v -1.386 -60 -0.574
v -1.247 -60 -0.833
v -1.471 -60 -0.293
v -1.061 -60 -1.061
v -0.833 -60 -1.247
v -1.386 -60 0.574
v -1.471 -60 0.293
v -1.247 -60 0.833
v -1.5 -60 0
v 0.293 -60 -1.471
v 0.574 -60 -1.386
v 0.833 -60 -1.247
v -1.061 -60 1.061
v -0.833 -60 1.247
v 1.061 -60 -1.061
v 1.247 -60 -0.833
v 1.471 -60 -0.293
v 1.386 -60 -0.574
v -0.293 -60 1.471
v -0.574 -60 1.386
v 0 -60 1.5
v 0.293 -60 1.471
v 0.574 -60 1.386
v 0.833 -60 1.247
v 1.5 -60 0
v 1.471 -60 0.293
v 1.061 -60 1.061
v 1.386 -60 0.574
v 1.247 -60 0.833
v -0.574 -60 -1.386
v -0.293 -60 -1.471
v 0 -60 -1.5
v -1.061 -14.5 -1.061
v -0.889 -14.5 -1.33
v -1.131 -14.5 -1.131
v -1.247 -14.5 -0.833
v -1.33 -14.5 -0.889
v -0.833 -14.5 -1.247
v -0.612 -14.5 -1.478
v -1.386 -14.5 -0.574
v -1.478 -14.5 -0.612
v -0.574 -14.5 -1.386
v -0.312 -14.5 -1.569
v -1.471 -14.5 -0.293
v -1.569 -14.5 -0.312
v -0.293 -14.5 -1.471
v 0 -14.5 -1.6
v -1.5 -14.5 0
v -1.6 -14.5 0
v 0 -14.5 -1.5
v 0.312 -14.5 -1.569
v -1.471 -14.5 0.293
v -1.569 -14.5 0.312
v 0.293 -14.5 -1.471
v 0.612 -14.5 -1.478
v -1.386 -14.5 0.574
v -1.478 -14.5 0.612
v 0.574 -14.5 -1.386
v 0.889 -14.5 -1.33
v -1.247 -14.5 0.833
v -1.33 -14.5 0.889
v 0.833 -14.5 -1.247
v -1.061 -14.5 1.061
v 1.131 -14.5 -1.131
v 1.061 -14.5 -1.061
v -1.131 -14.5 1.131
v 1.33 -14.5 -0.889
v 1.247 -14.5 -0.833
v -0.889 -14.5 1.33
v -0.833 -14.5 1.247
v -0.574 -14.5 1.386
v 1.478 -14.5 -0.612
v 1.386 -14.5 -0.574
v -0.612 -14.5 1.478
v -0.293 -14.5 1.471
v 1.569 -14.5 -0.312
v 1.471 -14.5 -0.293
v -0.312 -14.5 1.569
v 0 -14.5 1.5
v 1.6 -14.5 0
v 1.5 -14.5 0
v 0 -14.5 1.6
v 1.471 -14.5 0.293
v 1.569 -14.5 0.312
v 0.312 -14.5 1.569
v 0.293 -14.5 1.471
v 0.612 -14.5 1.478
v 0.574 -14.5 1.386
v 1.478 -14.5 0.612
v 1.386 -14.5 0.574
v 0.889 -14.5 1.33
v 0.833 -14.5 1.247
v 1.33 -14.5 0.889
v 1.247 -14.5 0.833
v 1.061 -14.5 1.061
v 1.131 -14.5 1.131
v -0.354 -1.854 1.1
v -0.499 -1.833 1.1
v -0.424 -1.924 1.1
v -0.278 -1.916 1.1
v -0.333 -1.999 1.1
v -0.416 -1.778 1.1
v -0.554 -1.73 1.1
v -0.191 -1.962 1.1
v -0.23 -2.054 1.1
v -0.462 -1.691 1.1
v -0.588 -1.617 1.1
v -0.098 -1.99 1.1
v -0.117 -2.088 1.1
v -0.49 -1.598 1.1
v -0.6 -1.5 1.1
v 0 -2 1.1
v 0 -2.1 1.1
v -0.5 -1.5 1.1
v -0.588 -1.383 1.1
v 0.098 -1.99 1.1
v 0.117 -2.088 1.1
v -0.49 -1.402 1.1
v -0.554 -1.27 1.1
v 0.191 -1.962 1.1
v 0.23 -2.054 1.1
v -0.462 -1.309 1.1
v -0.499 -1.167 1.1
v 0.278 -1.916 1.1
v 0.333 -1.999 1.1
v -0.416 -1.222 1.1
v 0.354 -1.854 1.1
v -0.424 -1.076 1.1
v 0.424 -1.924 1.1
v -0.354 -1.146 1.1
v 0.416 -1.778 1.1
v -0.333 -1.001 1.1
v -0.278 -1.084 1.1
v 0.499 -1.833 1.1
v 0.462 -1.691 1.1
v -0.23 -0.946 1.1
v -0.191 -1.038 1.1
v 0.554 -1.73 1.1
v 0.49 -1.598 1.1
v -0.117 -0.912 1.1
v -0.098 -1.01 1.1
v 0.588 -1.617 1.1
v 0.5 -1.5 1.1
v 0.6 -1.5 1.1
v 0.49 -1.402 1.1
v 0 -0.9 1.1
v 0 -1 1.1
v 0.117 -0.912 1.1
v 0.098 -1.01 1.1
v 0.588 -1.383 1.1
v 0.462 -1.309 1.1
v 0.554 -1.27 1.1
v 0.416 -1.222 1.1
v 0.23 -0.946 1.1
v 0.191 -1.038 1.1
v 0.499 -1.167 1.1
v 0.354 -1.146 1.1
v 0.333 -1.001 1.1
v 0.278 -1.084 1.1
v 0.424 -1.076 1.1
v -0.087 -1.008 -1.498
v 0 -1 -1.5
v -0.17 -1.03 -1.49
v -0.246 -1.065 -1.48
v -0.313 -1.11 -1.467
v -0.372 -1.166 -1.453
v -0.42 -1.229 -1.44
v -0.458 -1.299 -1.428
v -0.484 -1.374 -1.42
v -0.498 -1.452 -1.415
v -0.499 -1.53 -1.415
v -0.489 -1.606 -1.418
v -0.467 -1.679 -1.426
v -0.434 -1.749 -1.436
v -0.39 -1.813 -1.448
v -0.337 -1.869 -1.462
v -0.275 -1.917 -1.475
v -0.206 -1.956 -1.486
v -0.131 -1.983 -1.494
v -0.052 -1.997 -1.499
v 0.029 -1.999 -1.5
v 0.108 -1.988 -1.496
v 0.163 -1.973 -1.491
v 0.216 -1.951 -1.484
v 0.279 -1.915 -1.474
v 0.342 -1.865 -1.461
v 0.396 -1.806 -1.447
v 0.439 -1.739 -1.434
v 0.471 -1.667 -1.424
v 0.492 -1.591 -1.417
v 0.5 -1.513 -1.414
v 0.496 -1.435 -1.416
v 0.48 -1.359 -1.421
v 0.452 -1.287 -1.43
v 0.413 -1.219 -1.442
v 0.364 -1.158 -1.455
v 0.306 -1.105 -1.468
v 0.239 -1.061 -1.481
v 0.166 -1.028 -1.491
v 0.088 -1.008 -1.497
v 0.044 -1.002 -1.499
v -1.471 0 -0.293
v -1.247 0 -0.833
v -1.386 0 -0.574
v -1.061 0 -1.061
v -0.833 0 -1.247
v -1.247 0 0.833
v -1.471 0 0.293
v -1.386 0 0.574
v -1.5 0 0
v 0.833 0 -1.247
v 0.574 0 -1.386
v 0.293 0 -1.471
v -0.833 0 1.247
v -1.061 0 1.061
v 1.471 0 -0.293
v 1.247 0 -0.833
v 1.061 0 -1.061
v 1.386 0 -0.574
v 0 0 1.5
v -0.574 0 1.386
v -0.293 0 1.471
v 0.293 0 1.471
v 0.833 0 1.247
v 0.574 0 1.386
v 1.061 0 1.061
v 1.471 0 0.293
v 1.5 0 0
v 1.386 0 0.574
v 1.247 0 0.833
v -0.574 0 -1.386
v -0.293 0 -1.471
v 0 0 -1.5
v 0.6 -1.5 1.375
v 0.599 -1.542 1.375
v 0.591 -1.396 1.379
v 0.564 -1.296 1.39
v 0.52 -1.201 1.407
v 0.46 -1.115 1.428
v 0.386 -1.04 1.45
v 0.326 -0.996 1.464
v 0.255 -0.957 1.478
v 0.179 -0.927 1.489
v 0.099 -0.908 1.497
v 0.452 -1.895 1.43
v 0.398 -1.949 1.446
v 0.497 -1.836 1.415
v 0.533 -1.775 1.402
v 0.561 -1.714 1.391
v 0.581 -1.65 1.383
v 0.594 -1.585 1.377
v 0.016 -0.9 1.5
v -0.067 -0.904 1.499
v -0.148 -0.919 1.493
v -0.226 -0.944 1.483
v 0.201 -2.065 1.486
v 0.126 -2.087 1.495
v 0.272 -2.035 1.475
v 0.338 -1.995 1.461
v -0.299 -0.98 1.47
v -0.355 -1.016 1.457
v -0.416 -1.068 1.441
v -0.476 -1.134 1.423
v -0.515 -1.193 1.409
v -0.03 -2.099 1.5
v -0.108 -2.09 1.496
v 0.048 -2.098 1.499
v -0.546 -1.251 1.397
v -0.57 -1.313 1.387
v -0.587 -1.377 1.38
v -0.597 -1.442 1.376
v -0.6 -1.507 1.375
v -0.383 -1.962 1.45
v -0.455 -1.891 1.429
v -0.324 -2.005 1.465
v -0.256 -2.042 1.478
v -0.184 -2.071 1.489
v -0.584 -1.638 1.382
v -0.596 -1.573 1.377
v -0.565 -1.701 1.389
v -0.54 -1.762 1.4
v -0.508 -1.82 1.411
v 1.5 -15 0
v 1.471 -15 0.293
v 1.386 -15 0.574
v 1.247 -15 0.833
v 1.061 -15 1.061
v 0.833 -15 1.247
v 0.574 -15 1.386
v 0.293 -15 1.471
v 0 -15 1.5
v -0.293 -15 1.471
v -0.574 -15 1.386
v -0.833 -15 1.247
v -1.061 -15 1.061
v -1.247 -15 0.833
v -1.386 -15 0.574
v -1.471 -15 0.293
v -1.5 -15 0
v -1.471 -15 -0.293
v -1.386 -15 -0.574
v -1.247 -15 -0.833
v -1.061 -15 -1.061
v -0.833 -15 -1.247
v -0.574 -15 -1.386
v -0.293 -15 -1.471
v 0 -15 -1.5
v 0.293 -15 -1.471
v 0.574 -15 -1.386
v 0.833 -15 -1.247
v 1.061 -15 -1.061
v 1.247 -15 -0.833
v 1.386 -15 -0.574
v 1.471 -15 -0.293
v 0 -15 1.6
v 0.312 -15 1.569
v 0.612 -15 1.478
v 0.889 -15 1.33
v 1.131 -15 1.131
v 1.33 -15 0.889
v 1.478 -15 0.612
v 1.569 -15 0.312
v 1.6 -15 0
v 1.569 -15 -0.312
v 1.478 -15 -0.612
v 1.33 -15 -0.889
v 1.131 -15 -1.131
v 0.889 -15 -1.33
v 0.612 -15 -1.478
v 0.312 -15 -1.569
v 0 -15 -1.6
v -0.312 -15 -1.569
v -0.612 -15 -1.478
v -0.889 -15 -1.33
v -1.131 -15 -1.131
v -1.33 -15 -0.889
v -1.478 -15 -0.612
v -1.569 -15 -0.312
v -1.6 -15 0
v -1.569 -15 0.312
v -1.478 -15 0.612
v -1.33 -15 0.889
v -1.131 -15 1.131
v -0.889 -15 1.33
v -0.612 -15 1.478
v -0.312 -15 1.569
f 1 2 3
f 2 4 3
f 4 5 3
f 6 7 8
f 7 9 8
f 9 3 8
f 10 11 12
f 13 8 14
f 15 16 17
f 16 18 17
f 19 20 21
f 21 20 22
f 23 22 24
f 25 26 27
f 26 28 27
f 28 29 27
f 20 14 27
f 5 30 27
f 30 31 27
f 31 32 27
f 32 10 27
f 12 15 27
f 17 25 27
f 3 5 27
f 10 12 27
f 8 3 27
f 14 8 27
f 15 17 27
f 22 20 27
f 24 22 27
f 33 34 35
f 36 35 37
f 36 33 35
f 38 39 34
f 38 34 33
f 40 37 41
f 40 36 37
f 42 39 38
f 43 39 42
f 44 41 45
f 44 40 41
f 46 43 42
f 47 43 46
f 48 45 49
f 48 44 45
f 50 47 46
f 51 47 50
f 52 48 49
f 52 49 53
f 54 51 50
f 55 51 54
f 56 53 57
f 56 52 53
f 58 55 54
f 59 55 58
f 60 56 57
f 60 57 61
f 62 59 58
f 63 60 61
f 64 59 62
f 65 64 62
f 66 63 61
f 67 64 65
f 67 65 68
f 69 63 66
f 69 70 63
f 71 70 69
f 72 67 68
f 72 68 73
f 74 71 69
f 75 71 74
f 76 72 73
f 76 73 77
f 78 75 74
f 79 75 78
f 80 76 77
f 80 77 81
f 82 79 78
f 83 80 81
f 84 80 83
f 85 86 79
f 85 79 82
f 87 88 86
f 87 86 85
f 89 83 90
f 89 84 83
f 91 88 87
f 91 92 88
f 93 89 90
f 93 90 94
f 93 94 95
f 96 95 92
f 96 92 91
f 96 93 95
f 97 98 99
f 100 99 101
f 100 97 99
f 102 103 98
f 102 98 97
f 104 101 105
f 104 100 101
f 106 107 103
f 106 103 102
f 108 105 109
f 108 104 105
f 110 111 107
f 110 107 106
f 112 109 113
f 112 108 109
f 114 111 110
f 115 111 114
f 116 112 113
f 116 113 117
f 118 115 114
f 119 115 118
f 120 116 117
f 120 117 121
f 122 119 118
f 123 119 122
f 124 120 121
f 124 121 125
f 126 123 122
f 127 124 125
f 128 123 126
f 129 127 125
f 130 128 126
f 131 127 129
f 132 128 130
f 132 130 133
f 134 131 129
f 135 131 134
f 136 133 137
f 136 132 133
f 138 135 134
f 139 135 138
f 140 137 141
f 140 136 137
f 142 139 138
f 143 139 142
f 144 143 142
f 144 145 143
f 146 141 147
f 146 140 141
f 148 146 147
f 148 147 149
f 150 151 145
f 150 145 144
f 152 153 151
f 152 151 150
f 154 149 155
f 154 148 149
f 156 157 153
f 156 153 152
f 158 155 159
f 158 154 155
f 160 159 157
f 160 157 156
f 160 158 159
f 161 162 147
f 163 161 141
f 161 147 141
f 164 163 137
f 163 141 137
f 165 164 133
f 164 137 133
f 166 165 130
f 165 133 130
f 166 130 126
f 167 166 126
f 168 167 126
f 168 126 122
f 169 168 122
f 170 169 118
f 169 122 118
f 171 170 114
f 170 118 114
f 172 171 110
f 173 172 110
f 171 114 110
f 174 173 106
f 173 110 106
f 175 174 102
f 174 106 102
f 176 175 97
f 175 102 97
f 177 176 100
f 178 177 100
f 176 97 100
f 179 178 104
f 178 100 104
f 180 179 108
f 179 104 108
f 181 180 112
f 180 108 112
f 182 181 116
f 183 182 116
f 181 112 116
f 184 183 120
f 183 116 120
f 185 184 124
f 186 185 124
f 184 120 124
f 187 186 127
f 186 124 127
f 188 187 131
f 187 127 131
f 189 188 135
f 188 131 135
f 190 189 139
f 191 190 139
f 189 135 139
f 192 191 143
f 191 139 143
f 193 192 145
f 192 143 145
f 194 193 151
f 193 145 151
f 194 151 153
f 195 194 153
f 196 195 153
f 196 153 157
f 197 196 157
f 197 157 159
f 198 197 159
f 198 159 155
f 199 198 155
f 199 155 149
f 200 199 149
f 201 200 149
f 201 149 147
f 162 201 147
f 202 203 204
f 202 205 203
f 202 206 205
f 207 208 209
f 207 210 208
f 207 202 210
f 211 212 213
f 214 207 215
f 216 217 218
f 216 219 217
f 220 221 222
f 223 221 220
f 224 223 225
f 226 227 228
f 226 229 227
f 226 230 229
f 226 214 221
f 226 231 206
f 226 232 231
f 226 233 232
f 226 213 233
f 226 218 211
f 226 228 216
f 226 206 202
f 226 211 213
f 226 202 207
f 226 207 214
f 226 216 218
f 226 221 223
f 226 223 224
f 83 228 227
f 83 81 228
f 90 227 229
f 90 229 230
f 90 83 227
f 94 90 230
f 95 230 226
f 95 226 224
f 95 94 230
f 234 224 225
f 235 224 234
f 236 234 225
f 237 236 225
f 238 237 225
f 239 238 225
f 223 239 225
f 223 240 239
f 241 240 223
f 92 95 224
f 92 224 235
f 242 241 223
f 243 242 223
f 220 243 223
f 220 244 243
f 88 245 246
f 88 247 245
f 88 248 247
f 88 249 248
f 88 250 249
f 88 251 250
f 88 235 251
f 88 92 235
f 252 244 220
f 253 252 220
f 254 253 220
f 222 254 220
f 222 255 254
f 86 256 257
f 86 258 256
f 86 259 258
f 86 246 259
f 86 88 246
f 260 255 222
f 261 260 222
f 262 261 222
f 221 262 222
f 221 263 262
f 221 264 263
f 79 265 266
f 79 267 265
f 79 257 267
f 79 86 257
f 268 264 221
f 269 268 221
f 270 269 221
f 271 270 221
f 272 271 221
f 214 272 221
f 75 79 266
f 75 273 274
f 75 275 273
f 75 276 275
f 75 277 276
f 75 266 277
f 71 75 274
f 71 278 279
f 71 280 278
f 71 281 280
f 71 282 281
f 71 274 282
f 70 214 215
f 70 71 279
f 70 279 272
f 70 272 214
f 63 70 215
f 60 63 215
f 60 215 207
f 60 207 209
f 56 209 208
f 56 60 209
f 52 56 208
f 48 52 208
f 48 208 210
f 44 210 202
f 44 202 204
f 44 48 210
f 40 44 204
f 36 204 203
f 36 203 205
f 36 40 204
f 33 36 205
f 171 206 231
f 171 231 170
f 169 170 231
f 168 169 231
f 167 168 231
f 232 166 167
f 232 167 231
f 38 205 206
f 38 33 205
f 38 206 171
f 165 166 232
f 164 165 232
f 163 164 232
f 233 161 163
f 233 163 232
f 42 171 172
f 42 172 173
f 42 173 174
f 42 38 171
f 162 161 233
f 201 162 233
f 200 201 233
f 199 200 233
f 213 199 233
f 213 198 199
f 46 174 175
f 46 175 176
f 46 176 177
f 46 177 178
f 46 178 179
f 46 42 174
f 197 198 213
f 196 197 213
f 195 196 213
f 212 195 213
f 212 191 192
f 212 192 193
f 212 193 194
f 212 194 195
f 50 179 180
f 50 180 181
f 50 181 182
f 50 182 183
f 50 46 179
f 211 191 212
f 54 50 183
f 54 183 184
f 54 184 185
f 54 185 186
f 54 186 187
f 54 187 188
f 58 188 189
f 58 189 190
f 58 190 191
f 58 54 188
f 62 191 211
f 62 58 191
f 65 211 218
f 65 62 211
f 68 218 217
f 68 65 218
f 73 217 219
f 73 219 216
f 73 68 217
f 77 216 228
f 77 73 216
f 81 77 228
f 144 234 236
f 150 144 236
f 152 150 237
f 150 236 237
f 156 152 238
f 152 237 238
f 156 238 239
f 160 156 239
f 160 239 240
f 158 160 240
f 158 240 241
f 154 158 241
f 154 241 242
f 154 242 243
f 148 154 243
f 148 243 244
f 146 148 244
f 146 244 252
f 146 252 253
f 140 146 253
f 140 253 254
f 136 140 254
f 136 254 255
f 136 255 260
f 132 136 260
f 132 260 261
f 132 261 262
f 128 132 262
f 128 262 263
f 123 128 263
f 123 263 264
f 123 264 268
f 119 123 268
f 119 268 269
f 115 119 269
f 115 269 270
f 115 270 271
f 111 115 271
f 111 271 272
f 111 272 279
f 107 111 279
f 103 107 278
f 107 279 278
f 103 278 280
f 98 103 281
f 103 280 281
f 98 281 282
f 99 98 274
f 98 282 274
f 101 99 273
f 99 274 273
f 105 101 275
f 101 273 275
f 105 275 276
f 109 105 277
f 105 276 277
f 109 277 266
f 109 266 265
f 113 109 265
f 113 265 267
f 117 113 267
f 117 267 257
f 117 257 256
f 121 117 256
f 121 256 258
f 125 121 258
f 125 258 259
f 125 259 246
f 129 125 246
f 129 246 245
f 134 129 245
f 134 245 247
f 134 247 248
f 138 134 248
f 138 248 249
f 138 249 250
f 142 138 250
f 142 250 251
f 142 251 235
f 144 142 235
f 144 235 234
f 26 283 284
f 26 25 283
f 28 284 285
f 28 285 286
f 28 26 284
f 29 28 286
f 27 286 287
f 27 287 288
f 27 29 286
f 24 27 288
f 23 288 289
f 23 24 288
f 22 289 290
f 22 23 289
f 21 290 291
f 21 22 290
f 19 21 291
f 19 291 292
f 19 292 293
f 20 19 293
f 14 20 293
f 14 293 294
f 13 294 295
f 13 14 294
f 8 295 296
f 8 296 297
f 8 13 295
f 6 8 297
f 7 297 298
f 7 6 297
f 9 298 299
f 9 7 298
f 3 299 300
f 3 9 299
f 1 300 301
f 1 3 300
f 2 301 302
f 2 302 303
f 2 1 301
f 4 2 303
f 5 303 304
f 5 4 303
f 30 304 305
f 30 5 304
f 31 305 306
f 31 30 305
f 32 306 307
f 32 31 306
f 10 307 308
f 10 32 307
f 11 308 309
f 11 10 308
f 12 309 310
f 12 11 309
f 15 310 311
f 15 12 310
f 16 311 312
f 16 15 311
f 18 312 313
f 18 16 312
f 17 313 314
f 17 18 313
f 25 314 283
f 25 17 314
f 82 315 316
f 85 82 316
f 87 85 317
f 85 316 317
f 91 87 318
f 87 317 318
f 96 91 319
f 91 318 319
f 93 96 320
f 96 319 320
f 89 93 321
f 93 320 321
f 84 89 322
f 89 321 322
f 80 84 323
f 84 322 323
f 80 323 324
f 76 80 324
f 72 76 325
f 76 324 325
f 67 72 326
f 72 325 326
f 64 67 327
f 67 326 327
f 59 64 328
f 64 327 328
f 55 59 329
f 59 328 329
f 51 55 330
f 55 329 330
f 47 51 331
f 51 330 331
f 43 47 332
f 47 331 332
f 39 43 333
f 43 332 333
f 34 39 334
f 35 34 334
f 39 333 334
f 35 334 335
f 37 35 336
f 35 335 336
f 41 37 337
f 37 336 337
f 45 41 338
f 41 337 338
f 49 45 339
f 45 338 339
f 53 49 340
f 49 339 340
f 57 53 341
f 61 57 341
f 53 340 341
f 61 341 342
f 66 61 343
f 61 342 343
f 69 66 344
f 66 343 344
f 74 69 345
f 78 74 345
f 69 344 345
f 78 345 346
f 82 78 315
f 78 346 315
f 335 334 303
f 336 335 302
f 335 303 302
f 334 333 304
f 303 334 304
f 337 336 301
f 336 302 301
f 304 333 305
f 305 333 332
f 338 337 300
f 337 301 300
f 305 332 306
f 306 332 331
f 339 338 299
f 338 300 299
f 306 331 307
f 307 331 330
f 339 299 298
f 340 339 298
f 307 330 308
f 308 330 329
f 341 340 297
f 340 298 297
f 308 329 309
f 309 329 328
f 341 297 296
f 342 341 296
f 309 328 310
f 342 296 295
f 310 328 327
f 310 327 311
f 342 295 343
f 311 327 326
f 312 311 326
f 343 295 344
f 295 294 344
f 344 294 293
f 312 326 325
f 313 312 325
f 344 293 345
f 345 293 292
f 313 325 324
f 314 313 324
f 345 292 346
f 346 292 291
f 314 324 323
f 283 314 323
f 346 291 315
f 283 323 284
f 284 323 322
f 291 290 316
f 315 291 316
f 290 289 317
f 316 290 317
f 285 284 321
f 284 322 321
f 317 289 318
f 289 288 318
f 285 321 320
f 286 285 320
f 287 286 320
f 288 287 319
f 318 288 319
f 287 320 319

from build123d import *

# Parameters (mm, degrees)
SKETCH2_R           = 1.5
SKETCH4_R           = 0.5
CUT_EXTRUDE1_DEPTH  = 2
CUT_EXTRUDE2_START  = 1.6
SKETCH6_R           = 0.6
CUT_EXTRUDE2_DEPTH  = 0.5
BOSS_EXTRUDE1_START = -15
SKETCH7_R           = 1.6
BOSS_EXTRUDE1_DEPTH = 0.5


with BuildPart() as part:
    # Sweep1: sweep along a path in Sketch3
    with BuildLine(Plane(origin=(0, 0, 0), x_dir=(0, 0, -1), z_dir=(1, 0, 0))) as sweep1_path:
        Line((0, 0), (0, -60))
    # Sketch2 → Sweep1 (sweep)
    with BuildSketch(Plane(origin=(0, 0, 0), x_dir=(1, 0, 0), z_dir=(0, 1, 0))):
        Circle(SKETCH2_R)
    sweep(path=sweep1_path.line)

    # Sketch4 → Cut-Extrude1 (cut, symmetric)
    with BuildSketch(Plane.XY):
        with Locations(Location((0, -1.5, 0), (0, 0, 89.999999987))):
            Circle(SKETCH4_R)
    extrude(amount=CUT_EXTRUDE1_DEPTH, both=True, mode=Mode.SUBTRACT)

    # Sketch6 → Cut-Extrude2 (cut)
    with BuildSketch(Plane.XY.offset(CUT_EXTRUDE2_START)):
        with Locations((0, -1.5)):
            Circle(SKETCH6_R)
    extrude(amount=-CUT_EXTRUDE2_DEPTH, mode=Mode.SUBTRACT)

    # Sketch7 → Boss-Extrude1 (add)
    with BuildSketch(Plane(origin=(0, 0, 0), x_dir=(1, 0, 0), z_dir=(0, 1, 0)).offset(BOSS_EXTRUDE1_START)):
        with Locations(Location((0, 0, 0), (0, 0, 270))):
            Circle(SKETCH7_R)
    extrude(amount=BOSS_EXTRUDE1_DEPTH)


solid = part.part
